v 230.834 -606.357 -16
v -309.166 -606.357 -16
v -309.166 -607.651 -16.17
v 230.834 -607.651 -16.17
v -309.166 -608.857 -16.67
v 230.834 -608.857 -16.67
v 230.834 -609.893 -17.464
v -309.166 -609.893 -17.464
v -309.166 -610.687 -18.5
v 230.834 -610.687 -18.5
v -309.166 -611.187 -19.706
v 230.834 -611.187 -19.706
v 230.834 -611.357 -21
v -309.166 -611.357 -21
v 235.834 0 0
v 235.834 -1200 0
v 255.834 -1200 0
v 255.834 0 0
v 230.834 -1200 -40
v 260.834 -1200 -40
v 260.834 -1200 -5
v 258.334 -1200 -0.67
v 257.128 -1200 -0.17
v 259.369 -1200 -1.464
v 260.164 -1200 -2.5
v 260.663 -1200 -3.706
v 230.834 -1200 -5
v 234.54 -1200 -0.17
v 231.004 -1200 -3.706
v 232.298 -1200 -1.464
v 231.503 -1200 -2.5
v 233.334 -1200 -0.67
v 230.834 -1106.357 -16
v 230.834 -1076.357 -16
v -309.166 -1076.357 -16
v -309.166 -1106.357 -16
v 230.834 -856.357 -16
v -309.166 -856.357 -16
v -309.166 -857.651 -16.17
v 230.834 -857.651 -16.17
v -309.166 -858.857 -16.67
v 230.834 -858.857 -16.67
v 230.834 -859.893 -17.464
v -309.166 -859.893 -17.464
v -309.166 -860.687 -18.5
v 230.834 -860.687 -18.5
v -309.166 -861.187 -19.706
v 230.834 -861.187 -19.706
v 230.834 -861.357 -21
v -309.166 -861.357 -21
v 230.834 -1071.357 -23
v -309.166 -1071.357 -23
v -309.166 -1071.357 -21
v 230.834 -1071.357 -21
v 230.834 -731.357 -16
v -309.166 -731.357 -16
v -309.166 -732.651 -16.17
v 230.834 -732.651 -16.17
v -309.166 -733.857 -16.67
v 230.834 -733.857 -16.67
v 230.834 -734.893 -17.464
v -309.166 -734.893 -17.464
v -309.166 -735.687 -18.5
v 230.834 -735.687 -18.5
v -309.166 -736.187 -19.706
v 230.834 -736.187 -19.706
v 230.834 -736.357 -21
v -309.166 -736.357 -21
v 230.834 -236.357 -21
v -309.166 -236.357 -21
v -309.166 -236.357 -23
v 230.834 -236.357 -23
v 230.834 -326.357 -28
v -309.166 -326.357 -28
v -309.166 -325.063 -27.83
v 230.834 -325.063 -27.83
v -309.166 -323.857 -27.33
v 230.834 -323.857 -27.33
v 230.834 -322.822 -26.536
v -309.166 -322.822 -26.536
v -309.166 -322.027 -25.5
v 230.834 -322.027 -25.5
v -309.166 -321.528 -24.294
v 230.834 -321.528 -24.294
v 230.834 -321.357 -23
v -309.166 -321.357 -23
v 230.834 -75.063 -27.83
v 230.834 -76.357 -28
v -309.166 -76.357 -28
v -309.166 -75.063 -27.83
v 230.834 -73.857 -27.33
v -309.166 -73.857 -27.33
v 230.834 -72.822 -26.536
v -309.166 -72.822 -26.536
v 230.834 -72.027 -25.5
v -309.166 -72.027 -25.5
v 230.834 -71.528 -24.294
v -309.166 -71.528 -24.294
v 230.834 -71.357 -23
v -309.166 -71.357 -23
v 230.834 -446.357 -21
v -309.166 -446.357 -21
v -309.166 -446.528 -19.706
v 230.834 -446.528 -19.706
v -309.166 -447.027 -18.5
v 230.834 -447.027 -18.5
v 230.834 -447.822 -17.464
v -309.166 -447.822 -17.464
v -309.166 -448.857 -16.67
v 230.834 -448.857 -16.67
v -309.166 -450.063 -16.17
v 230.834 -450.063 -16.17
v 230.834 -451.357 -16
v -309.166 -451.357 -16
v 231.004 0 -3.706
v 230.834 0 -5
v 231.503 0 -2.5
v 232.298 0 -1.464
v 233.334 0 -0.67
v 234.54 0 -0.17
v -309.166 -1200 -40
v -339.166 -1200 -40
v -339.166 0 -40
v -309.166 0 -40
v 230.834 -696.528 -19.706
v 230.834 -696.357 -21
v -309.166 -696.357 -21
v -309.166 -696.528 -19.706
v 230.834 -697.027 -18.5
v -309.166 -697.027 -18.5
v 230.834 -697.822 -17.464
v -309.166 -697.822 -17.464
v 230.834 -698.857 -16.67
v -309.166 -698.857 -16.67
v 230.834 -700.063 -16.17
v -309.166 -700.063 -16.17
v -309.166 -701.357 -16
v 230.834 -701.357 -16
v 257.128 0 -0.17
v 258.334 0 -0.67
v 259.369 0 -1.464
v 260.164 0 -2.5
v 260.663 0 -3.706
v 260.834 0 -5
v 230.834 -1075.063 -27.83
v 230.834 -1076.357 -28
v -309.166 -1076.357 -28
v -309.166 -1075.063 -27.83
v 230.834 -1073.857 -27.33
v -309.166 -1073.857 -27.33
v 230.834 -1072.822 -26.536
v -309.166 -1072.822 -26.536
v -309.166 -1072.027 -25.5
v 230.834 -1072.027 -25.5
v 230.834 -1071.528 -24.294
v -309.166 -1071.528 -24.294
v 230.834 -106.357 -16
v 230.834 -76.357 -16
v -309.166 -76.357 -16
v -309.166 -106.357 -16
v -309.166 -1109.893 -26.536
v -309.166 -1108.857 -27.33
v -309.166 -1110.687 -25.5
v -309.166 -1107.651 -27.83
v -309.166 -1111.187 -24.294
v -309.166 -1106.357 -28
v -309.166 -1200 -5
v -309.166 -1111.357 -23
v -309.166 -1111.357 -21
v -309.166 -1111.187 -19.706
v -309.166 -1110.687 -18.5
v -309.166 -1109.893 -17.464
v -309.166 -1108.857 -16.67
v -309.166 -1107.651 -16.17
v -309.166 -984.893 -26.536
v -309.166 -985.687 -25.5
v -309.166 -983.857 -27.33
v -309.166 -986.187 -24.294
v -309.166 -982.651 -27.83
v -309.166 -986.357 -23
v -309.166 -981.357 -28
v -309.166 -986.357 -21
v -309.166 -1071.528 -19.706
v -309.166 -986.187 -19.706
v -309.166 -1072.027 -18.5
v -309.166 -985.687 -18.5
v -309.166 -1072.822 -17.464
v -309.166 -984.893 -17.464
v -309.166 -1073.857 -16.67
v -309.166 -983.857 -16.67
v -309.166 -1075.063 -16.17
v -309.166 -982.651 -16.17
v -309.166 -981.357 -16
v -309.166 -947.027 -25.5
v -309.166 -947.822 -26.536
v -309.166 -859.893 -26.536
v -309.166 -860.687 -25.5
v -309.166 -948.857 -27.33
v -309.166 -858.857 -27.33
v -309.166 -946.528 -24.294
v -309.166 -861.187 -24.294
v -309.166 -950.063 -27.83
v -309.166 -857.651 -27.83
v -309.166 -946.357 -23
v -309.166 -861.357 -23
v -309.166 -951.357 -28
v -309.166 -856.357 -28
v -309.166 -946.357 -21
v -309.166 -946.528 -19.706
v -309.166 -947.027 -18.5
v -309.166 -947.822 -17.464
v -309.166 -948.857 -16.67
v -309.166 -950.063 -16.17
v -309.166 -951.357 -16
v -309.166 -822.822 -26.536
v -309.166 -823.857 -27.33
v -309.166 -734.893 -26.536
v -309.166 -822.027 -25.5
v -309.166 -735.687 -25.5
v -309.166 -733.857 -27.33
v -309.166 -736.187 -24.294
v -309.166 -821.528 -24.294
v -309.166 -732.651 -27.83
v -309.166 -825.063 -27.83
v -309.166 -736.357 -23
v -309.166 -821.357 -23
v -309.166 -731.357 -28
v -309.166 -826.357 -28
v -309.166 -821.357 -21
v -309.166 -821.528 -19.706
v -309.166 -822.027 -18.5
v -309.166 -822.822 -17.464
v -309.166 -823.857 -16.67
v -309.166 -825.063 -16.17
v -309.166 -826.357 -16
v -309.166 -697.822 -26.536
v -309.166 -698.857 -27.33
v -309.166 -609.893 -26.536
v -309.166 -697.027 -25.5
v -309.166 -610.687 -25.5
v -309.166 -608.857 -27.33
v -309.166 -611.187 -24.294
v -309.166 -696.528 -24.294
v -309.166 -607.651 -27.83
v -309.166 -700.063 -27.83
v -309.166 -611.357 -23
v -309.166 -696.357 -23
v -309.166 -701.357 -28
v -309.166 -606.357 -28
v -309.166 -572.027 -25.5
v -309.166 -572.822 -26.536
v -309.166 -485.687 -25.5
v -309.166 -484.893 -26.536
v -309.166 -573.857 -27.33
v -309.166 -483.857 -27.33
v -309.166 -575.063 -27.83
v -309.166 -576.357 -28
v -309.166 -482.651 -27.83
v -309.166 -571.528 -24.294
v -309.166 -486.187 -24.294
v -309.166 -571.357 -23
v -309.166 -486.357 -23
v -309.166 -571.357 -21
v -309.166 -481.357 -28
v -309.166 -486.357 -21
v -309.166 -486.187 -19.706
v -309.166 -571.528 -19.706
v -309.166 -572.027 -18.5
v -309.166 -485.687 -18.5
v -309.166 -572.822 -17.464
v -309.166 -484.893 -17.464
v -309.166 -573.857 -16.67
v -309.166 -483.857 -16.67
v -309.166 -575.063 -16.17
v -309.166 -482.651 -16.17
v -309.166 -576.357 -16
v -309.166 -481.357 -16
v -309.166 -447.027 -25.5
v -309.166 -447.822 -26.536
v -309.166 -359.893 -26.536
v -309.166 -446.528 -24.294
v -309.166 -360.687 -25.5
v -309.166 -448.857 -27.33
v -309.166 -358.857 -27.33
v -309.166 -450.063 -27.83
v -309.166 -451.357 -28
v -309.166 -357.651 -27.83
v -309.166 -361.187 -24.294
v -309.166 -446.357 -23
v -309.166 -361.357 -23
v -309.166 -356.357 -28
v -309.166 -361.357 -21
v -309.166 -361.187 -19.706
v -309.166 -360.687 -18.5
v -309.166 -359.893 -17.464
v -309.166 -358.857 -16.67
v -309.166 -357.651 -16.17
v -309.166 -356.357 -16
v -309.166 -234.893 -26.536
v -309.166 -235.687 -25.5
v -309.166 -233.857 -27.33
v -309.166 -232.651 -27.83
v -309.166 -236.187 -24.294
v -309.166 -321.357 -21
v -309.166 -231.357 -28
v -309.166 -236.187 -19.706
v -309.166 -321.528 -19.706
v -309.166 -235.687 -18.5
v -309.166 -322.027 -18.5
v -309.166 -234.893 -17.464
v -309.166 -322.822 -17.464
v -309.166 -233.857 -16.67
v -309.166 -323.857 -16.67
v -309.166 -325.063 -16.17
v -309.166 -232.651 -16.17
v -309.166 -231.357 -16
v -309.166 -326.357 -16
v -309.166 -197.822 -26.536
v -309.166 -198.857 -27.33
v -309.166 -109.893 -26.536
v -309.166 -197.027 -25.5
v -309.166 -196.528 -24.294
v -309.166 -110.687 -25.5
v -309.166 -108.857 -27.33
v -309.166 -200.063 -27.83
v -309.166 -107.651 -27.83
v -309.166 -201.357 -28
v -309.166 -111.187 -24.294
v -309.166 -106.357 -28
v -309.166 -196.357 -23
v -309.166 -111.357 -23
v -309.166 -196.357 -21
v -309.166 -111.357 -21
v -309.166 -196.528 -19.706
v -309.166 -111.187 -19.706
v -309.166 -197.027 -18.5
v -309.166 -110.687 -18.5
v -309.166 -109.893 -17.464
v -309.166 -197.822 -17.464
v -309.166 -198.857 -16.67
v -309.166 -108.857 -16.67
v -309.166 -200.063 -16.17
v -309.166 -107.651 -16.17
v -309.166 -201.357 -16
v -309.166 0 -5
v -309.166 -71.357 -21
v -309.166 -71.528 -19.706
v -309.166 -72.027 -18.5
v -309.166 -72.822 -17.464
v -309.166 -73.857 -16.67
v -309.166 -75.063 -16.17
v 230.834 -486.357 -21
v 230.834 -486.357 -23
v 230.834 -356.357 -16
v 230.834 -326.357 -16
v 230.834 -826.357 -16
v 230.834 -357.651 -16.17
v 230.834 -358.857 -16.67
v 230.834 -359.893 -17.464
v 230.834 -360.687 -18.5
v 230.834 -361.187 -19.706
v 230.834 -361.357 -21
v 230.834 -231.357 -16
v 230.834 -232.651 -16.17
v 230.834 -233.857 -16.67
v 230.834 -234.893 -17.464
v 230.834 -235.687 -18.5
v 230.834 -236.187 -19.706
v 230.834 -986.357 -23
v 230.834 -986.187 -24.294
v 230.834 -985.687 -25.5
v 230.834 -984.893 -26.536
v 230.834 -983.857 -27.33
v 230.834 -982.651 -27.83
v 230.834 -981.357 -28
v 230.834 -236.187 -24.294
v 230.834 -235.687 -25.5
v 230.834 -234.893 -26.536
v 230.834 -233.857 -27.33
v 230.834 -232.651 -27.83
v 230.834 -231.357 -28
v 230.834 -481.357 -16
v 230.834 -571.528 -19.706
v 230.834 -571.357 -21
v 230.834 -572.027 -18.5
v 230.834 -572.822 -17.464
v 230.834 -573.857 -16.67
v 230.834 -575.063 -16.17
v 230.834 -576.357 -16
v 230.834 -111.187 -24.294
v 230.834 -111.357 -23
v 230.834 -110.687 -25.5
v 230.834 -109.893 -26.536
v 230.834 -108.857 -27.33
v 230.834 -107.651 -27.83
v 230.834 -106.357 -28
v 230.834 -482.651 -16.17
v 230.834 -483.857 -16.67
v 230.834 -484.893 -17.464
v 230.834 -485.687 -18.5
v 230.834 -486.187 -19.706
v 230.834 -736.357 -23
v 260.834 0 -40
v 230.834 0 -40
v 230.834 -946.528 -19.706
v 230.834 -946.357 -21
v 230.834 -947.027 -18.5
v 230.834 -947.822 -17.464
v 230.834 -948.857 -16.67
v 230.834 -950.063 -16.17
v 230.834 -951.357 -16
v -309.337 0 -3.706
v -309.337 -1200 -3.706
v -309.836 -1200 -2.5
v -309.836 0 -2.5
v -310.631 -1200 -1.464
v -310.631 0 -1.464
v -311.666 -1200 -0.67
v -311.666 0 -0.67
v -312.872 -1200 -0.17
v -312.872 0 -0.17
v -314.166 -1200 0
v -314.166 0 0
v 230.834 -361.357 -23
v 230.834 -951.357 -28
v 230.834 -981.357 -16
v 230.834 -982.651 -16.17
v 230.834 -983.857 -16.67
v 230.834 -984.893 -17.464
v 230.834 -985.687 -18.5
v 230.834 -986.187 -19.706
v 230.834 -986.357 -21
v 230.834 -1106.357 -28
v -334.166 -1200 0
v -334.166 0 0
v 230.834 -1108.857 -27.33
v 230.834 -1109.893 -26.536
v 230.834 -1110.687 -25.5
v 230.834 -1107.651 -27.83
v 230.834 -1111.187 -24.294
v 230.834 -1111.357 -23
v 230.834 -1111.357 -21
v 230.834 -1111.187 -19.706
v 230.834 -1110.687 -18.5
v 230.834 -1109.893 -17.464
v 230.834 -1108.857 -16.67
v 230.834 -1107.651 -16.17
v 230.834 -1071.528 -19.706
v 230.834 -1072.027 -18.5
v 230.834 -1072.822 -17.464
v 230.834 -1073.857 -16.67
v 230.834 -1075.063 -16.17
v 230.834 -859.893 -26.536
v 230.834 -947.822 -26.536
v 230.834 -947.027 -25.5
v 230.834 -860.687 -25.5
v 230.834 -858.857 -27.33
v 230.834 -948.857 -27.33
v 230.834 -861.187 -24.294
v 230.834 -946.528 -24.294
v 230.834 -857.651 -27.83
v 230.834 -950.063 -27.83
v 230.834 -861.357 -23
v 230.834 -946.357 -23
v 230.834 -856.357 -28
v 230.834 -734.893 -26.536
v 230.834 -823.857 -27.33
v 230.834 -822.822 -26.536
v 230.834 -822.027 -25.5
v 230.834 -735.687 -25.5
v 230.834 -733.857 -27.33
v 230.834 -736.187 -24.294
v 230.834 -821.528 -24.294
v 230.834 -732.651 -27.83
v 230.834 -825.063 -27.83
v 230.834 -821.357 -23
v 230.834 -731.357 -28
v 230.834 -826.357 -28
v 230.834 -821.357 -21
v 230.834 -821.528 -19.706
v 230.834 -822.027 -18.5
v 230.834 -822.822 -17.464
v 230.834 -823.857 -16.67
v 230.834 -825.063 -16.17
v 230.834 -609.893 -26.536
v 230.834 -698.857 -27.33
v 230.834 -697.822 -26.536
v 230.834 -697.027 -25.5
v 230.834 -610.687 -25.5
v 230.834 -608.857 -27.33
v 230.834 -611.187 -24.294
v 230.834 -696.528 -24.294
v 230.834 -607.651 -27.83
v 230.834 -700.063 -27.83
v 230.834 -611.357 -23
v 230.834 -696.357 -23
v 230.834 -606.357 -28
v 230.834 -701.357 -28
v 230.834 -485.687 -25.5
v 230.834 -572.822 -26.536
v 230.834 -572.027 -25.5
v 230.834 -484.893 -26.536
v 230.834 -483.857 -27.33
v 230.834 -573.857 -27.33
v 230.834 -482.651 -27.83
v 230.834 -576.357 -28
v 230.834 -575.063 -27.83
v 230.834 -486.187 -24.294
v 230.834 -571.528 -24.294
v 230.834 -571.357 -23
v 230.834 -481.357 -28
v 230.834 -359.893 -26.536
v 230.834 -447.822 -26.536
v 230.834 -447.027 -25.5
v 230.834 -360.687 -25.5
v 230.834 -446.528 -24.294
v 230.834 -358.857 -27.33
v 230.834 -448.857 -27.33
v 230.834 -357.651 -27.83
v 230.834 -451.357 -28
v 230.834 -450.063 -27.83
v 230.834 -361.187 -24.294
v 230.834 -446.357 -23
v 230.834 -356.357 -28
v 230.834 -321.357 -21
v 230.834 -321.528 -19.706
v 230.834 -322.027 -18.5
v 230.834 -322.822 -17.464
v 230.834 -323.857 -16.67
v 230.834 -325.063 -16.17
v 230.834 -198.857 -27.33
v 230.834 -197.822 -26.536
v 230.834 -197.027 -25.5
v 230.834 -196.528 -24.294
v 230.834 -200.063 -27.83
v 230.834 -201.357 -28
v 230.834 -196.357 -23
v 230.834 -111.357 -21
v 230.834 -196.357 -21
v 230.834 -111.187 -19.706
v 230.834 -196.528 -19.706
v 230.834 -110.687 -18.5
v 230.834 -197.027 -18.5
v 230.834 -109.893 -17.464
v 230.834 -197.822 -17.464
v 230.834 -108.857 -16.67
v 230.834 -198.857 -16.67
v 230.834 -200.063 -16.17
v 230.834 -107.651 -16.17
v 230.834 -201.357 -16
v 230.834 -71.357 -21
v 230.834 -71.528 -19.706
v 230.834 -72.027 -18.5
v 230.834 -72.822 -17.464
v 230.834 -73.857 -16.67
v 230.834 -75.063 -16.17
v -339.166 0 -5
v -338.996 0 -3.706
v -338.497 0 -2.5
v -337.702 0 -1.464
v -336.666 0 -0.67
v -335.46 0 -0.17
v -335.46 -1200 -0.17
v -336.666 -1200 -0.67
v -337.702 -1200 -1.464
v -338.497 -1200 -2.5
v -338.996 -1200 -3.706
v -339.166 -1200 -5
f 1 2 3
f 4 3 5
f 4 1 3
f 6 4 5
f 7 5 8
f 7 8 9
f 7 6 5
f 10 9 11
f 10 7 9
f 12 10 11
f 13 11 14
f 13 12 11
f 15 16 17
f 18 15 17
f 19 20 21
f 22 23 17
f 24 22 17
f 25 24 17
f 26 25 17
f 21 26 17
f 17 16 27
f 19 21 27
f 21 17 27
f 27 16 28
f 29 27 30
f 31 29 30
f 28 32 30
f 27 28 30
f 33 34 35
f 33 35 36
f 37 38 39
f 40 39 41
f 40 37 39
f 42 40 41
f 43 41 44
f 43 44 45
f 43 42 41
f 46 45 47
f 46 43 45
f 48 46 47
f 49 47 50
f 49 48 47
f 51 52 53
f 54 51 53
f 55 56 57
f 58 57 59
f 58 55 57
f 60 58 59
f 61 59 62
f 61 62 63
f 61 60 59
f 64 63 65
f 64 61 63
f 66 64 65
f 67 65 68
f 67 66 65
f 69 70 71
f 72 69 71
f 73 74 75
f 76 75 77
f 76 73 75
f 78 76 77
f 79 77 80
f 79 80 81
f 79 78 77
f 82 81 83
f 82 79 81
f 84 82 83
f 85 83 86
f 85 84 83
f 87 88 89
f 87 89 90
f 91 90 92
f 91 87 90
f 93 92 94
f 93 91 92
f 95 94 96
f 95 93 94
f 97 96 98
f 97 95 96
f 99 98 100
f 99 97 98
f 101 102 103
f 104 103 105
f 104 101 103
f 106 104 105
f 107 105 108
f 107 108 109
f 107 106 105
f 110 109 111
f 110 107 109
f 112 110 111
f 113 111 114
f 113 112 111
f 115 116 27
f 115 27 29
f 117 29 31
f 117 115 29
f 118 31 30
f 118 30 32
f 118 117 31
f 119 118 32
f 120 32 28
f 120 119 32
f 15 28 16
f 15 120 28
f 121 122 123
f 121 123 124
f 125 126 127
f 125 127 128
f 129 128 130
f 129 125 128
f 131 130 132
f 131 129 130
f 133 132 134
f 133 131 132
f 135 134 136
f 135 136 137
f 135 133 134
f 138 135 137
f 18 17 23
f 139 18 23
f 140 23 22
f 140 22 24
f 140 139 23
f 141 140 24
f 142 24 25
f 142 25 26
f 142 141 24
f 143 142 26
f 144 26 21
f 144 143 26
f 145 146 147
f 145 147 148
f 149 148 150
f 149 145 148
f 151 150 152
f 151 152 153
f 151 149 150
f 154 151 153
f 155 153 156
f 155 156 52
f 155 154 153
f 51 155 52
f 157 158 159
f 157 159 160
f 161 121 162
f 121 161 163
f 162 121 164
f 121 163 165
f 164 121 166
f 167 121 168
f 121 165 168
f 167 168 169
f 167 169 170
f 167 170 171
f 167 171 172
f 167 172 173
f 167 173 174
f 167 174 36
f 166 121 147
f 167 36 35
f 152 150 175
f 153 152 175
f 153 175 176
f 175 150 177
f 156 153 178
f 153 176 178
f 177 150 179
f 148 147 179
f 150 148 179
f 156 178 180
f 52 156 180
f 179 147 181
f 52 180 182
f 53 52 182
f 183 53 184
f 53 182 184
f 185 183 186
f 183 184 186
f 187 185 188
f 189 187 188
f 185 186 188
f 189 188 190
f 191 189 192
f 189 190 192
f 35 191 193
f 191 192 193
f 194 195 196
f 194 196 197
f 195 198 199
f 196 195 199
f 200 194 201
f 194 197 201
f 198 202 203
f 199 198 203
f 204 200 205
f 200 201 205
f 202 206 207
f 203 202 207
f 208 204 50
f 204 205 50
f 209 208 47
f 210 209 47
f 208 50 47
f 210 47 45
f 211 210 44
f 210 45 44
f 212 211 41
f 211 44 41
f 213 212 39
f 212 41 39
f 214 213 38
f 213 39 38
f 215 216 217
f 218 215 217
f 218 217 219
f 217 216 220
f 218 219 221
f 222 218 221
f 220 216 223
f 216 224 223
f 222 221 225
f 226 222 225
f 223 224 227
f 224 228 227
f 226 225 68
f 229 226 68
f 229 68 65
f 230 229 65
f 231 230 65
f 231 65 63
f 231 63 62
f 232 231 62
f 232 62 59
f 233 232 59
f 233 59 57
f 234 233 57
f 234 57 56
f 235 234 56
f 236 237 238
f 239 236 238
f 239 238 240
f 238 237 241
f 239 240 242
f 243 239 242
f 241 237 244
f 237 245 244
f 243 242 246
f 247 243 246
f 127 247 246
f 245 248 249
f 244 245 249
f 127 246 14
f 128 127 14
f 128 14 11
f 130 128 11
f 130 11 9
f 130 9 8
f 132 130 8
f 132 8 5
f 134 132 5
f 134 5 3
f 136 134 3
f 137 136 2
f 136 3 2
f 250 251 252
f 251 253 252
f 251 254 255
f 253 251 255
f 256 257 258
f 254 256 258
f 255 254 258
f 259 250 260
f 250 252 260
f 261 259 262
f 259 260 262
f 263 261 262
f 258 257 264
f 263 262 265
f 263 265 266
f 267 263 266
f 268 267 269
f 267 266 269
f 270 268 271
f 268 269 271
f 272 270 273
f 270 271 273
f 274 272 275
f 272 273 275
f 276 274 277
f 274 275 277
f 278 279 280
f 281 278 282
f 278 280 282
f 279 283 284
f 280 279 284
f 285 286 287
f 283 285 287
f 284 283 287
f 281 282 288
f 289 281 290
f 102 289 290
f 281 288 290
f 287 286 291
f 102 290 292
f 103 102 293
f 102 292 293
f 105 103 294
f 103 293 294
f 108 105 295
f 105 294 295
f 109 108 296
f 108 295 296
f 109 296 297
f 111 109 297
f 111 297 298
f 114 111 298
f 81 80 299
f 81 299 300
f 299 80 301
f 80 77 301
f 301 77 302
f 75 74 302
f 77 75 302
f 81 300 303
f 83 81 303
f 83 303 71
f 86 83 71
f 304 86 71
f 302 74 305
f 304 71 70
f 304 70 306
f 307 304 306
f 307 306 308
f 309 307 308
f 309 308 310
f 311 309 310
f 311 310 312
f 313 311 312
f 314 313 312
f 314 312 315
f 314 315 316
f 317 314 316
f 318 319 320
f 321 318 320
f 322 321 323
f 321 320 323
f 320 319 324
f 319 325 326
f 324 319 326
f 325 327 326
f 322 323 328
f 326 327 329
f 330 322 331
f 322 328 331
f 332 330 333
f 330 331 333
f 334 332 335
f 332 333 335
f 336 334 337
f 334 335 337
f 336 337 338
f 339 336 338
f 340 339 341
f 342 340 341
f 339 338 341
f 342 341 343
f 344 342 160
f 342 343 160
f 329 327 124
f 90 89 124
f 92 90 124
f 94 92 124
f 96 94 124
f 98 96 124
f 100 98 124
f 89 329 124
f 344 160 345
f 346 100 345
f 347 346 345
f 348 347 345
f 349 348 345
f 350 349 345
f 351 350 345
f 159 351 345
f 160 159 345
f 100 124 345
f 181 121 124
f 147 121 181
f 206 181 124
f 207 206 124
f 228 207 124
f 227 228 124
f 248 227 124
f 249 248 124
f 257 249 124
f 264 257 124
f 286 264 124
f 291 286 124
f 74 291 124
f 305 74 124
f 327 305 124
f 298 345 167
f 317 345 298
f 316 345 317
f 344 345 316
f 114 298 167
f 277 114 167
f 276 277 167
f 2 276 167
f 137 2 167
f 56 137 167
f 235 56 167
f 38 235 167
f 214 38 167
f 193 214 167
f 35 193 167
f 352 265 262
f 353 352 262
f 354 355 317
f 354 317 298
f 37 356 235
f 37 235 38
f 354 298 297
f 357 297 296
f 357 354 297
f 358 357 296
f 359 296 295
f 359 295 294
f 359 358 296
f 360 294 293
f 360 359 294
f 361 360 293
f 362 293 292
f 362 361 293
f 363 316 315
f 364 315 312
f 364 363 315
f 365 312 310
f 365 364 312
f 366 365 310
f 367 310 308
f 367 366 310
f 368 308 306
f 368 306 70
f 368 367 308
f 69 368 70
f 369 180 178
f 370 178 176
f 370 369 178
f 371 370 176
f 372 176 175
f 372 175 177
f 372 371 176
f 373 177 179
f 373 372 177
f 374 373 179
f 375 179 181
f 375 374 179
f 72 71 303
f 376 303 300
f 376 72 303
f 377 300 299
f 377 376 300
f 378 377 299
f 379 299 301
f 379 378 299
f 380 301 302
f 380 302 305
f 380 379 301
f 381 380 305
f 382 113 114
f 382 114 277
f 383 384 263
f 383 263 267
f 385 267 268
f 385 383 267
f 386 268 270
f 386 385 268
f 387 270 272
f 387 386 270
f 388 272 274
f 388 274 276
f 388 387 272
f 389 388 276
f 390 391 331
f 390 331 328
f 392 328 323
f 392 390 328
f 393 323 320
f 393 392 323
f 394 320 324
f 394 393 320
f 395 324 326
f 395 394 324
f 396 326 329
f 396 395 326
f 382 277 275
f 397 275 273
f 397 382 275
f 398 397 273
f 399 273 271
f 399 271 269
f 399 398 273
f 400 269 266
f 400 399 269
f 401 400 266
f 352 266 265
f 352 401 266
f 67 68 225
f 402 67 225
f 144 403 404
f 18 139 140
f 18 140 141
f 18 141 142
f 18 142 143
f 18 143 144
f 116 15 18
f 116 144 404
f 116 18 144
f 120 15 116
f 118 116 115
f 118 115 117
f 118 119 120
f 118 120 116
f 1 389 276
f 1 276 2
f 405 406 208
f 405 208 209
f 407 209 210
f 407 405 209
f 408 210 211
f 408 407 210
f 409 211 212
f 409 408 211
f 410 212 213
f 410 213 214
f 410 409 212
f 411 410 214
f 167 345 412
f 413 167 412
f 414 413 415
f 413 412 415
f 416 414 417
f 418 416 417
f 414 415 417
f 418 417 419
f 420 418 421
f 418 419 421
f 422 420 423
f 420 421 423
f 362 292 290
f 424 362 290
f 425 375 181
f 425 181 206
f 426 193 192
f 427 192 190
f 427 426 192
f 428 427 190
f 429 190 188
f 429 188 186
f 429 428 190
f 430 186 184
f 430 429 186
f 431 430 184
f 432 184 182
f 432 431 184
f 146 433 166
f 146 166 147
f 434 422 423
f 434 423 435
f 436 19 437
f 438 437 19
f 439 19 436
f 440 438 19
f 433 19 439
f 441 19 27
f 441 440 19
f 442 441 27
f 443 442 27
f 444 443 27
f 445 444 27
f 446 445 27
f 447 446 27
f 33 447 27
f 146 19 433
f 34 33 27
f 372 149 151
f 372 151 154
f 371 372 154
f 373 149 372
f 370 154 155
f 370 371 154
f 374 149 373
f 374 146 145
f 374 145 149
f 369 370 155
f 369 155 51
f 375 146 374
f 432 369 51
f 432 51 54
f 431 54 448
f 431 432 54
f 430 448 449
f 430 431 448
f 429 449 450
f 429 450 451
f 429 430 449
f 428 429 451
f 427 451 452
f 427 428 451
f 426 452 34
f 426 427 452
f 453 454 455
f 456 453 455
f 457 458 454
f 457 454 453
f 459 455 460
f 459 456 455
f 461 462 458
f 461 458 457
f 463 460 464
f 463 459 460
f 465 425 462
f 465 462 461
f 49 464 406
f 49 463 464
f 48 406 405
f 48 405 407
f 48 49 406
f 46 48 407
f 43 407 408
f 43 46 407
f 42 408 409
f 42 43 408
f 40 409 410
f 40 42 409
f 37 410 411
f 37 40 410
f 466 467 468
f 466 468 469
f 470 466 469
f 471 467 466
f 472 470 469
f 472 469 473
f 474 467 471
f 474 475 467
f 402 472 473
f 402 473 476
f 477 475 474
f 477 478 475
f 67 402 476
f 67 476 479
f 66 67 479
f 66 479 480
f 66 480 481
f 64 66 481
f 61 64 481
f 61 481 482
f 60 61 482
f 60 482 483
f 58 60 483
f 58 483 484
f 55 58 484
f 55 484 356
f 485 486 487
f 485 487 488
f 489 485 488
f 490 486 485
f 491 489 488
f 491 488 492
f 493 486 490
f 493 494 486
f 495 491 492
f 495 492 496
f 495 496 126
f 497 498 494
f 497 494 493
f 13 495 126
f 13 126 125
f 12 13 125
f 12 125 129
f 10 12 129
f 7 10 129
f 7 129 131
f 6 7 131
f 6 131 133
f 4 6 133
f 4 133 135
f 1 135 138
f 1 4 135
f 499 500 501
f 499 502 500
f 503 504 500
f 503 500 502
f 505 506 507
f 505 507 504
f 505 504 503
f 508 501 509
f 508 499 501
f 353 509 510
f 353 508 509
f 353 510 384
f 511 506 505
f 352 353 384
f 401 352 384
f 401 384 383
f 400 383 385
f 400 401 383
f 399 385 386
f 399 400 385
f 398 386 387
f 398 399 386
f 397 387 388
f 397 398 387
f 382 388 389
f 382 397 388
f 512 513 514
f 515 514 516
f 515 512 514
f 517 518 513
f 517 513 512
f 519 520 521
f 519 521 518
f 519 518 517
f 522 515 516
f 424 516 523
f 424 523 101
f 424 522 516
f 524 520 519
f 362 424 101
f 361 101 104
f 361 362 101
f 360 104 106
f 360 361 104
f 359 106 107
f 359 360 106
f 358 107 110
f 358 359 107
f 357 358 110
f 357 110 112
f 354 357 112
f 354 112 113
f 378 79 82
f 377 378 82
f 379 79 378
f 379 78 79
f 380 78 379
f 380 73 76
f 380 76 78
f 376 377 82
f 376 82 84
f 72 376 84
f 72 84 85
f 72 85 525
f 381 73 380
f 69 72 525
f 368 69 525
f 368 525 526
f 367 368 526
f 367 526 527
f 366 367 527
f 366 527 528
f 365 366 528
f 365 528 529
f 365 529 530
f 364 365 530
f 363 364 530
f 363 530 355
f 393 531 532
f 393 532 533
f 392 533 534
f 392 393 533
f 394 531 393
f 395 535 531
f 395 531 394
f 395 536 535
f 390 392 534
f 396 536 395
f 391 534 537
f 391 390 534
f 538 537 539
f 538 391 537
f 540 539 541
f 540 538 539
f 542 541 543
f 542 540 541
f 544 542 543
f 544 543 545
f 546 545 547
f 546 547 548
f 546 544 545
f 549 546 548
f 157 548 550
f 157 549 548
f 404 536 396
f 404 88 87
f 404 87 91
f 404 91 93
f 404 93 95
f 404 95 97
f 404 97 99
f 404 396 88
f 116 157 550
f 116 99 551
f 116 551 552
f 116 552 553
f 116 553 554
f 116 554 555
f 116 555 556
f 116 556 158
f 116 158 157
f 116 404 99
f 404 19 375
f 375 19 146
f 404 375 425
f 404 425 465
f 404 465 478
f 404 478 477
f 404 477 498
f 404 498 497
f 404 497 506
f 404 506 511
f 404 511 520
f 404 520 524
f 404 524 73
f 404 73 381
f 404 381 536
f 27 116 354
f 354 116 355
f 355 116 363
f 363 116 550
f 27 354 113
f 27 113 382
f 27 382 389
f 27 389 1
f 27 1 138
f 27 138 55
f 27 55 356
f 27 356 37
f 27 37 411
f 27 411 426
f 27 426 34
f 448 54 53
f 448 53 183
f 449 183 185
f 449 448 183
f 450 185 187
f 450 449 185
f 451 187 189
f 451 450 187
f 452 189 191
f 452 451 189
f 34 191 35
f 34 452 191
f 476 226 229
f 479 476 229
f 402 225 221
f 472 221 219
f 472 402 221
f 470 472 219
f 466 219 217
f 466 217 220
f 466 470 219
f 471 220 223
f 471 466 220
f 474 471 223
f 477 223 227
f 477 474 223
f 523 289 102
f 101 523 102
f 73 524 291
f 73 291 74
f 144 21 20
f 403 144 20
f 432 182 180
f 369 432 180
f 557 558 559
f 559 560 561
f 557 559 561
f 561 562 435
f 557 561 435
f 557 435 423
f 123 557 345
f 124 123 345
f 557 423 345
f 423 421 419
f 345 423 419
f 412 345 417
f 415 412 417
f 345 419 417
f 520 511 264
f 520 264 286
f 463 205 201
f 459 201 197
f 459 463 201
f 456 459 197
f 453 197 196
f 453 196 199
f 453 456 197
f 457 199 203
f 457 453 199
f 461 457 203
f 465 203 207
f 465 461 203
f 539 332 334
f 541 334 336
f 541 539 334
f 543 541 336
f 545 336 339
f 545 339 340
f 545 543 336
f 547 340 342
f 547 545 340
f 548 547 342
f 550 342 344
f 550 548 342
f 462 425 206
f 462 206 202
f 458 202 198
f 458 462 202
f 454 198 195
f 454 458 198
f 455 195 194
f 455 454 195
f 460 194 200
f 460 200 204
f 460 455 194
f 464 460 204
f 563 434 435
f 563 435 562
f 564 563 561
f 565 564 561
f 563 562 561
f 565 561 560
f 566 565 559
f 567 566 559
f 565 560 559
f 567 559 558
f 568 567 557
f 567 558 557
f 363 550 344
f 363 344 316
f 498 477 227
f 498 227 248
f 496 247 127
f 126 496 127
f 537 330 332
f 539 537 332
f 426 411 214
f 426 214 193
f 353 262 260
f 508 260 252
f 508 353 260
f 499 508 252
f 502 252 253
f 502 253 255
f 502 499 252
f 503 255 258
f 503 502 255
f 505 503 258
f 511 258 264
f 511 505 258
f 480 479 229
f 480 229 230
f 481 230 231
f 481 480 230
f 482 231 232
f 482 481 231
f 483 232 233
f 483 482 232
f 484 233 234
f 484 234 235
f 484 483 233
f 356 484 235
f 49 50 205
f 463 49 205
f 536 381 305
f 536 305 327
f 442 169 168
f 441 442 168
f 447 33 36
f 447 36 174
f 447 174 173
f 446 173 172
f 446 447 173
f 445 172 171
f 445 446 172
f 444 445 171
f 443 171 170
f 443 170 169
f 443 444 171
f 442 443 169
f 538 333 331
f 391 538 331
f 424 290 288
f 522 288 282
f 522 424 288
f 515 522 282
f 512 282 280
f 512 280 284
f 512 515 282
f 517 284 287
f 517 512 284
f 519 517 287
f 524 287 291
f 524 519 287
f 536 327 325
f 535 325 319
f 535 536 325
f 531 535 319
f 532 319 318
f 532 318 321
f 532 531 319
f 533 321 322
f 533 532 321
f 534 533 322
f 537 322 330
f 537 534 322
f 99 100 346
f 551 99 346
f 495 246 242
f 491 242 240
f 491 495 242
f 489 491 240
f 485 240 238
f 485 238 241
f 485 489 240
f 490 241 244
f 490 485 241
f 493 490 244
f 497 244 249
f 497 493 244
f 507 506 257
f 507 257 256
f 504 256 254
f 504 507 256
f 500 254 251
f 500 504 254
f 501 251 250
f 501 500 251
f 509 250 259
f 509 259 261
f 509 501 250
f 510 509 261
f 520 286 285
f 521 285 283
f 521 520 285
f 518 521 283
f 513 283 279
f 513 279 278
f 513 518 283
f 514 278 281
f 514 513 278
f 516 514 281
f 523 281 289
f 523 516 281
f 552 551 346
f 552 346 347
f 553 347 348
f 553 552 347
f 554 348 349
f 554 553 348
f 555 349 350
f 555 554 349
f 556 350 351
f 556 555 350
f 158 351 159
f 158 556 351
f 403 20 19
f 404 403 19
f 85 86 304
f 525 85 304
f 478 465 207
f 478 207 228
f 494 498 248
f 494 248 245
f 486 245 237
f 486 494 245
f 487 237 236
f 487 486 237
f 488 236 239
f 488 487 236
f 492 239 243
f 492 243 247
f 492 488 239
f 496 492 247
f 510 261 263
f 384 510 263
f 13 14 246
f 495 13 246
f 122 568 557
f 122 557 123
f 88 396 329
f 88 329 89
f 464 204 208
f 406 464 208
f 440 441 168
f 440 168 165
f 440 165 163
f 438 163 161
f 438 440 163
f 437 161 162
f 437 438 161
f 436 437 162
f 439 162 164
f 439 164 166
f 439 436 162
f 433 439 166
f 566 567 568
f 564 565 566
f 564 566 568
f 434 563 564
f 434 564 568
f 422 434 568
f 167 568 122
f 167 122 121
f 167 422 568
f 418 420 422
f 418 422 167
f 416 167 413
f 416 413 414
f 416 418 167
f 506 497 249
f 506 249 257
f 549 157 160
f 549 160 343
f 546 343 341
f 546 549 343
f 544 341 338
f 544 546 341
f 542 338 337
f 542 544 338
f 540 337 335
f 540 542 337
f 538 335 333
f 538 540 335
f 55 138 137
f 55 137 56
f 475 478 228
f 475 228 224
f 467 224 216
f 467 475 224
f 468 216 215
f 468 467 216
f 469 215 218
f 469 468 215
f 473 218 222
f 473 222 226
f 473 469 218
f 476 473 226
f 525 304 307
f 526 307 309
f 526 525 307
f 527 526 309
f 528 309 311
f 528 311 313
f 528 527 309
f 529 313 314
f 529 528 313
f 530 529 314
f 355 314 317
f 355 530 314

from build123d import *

# Parameters (mm, degrees)
F1_DEPTH = 1200
F3_DEPTH = 270


with BuildPart() as f1:
    # F0 (on Front) → F1 (new body)
    with BuildSketch(Plane.XZ):
        with BuildLine():
            Line((-314.166387, 0), (-334.166387, 0))
            ThreePointArc((-334.166387, 0), (-337.701921, -1.464466), (-339.166387, -5))
            Line((-339.166387, -5), (-339.166387, -40))
            Line((-339.166387, -40), (-309.166387, -40))
            Line((-309.166387, -40), (-309.166387, -5))
            ThreePointArc((-309.166387, -5), (-310.630854, -1.464466), (-314.166387, 0))
        make_face()
    extrude(amount=F1_DEPTH)

    # F2 (on face) → F3 (join)
    with BuildSketch(Plane.YZ.offset(-309.166387)):
        with BuildLine():
            Line((-1076.357331, -16), (-1106.357331, -16))
            ThreePointArc((-1106.357331, -16), (-1109.892865, -17.464466), (-1111.357331, -21))
            Line((-1111.357331, -21), (-1111.357331, -23))
            ThreePointArc((-1111.357331, -23), (-1109.892865, -26.535534), (-1106.357331, -28))
            Line((-1106.357331, -28), (-1076.357331, -28))
            ThreePointArc((-1076.357331, -28), (-1072.821797, -26.535534), (-1071.357331, -23))
            Line((-1071.357331, -23), (-1071.357331, -21))
            ThreePointArc((-1071.357331, -21), (-1072.821797, -17.464466), (-1076.357331, -16))
        make_face()
        with BuildLine():
            Line((-946.357331, -23), (-946.357331, -21))
            ThreePointArc((-946.357331, -21), (-947.821797, -17.464466), (-951.357331, -16))
            Line((-951.357331, -16), (-981.357331, -16))
            ThreePointArc((-981.357331, -16), (-984.892865, -17.464466), (-986.357331, -21))
            Line((-986.357331, -21), (-986.357331, -23))
            ThreePointArc((-986.357331, -23), (-984.892865, -26.535534), (-981.357331, -28))
            Line((-981.357331, -28), (-951.357331, -28))
            ThreePointArc((-951.357331, -28), (-947.821797, -26.535534), (-946.357331, -23))
        make_face()
        with BuildLine():
            Line((-821.357331, -23), (-821.357331, -21))
            ThreePointArc((-821.357331, -21), (-822.821797, -17.464466), (-826.357331, -16))
            Line((-826.357331, -16), (-856.357331, -16))
            ThreePointArc((-856.357331, -16), (-859.892865, -17.464466), (-861.357331, -21))
            Line((-861.357331, -21), (-861.357331, -23))
            ThreePointArc((-861.357331, -23), (-859.892865, -26.535534), (-856.357331, -28))
            Line((-856.357331, -28), (-826.357331, -28))
            ThreePointArc((-826.357331, -28), (-822.821797, -26.535534), (-821.357331, -23))
        make_face()
        with BuildLine():
            Line((-696.357331, -23), (-696.357331, -21))
            ThreePointArc((-696.357331, -21), (-697.821797, -17.464466), (-701.357331, -16))
            Line((-701.357331, -16), (-731.357331, -16))
            ThreePointArc((-731.357331, -16), (-734.892865, -17.464466), (-736.357331, -21))
            Line((-736.357331, -21), (-736.357331, -23))
            ThreePointArc((-736.357331, -23), (-734.892865, -26.535534), (-731.357331, -28))
            Line((-731.357331, -28), (-701.357331, -28))
            ThreePointArc((-701.357331, -28), (-697.821797, -26.535534), (-696.357331, -23))
        make_face()
        with BuildLine():
            Line((-571.357331, -23), (-571.357331, -21))
            ThreePointArc((-571.357331, -21), (-572.821797, -17.464466), (-576.357331, -16))
            Line((-576.357331, -16), (-606.357331, -16))
            ThreePointArc((-606.357331, -16), (-609.892865, -17.464466), (-611.357331, -21))
            Line((-611.357331, -21), (-611.357331, -23))
            ThreePointArc((-611.357331, -23), (-609.892865, -26.535534), (-606.357331, -28))
            Line((-606.357331, -28), (-576.357331, -28))
            ThreePointArc((-576.357331, -28), (-572.821797, -26.535534), (-571.357331, -23))
        make_face()
        with BuildLine():
            Line((-446.357331, -23), (-446.357331, -21))
            ThreePointArc((-446.357331, -21), (-447.821797, -17.464466), (-451.357331, -16))
            Line((-451.357331, -16), (-481.357331, -16))
            ThreePointArc((-481.357331, -16), (-484.892865, -17.464466), (-486.357331, -21))
            Line((-486.357331, -21), (-486.357331, -23))
            ThreePointArc((-486.357331, -23), (-484.892865, -26.535534), (-481.357331, -28))
            Line((-481.357331, -28), (-451.357331, -28))
            ThreePointArc((-451.357331, -28), (-447.821797, -26.535534), (-446.357331, -23))
        make_face()
        with BuildLine():
            Line((-321.357331, -23), (-321.357331, -21))
            ThreePointArc((-321.357331, -21), (-322.821797, -17.464466), (-326.357331, -16))
            Line((-326.357331, -16), (-356.357331, -16))
            ThreePointArc((-356.357331, -16), (-359.892865, -17.464466), (-361.357331, -21))
            Line((-361.357331, -21), (-361.357331, -23))
            ThreePointArc((-361.357331, -23), (-359.892865, -26.535534), (-356.357331, -28))
            Line((-356.357331, -28), (-326.357331, -28))
            ThreePointArc((-326.357331, -28), (-322.821797, -26.535534), (-321.357331, -23))
        make_face()
        with BuildLine():
            Line((-196.357331, -23), (-196.357331, -21))
            ThreePointArc((-196.357331, -21), (-197.821797, -17.464466), (-201.357331, -16))
            Line((-201.357331, -16), (-231.357331, -16))
            ThreePointArc((-231.357331, -16), (-234.892865, -17.464466), (-236.357331, -21))
            Line((-236.357331, -21), (-236.357331, -23))
            ThreePointArc((-236.357331, -23), (-234.892865, -26.535534), (-231.357331, -28))
            Line((-231.357331, -28), (-201.357331, -28))
            ThreePointArc((-201.357331, -28), (-197.821797, -26.535534), (-196.357331, -23))
        make_face()
        with BuildLine():
            Line((-71.357331, -23), (-71.357331, -21))
            ThreePointArc((-71.357331, -21), (-72.821797, -17.464466), (-76.357331, -16))
            Line((-76.357331, -16), (-106.357331, -16))
            ThreePointArc((-106.357331, -16), (-109.892865, -17.464466), (-111.357331, -21))
            Line((-111.357331, -21), (-111.357331, -23))
            ThreePointArc((-111.357331, -23), (-109.892865, -26.535534), (-106.357331, -28))
            Line((-106.357331, -28), (-76.357331, -28))
            ThreePointArc((-76.357331, -28), (-72.821797, -26.535534), (-71.357331, -23))
        make_face()
    extrude(amount=F3_DEPTH)

    # F4: F1 across face


with BuildPart() as f1_1:
    add(f1.part)
    add(f1.part.mirror(Plane(origin=(-39.166387, -841.357331, -22), x_dir=(0, 1, 0), z_dir=(1, 0, 0))))


solid = f1_1.part
